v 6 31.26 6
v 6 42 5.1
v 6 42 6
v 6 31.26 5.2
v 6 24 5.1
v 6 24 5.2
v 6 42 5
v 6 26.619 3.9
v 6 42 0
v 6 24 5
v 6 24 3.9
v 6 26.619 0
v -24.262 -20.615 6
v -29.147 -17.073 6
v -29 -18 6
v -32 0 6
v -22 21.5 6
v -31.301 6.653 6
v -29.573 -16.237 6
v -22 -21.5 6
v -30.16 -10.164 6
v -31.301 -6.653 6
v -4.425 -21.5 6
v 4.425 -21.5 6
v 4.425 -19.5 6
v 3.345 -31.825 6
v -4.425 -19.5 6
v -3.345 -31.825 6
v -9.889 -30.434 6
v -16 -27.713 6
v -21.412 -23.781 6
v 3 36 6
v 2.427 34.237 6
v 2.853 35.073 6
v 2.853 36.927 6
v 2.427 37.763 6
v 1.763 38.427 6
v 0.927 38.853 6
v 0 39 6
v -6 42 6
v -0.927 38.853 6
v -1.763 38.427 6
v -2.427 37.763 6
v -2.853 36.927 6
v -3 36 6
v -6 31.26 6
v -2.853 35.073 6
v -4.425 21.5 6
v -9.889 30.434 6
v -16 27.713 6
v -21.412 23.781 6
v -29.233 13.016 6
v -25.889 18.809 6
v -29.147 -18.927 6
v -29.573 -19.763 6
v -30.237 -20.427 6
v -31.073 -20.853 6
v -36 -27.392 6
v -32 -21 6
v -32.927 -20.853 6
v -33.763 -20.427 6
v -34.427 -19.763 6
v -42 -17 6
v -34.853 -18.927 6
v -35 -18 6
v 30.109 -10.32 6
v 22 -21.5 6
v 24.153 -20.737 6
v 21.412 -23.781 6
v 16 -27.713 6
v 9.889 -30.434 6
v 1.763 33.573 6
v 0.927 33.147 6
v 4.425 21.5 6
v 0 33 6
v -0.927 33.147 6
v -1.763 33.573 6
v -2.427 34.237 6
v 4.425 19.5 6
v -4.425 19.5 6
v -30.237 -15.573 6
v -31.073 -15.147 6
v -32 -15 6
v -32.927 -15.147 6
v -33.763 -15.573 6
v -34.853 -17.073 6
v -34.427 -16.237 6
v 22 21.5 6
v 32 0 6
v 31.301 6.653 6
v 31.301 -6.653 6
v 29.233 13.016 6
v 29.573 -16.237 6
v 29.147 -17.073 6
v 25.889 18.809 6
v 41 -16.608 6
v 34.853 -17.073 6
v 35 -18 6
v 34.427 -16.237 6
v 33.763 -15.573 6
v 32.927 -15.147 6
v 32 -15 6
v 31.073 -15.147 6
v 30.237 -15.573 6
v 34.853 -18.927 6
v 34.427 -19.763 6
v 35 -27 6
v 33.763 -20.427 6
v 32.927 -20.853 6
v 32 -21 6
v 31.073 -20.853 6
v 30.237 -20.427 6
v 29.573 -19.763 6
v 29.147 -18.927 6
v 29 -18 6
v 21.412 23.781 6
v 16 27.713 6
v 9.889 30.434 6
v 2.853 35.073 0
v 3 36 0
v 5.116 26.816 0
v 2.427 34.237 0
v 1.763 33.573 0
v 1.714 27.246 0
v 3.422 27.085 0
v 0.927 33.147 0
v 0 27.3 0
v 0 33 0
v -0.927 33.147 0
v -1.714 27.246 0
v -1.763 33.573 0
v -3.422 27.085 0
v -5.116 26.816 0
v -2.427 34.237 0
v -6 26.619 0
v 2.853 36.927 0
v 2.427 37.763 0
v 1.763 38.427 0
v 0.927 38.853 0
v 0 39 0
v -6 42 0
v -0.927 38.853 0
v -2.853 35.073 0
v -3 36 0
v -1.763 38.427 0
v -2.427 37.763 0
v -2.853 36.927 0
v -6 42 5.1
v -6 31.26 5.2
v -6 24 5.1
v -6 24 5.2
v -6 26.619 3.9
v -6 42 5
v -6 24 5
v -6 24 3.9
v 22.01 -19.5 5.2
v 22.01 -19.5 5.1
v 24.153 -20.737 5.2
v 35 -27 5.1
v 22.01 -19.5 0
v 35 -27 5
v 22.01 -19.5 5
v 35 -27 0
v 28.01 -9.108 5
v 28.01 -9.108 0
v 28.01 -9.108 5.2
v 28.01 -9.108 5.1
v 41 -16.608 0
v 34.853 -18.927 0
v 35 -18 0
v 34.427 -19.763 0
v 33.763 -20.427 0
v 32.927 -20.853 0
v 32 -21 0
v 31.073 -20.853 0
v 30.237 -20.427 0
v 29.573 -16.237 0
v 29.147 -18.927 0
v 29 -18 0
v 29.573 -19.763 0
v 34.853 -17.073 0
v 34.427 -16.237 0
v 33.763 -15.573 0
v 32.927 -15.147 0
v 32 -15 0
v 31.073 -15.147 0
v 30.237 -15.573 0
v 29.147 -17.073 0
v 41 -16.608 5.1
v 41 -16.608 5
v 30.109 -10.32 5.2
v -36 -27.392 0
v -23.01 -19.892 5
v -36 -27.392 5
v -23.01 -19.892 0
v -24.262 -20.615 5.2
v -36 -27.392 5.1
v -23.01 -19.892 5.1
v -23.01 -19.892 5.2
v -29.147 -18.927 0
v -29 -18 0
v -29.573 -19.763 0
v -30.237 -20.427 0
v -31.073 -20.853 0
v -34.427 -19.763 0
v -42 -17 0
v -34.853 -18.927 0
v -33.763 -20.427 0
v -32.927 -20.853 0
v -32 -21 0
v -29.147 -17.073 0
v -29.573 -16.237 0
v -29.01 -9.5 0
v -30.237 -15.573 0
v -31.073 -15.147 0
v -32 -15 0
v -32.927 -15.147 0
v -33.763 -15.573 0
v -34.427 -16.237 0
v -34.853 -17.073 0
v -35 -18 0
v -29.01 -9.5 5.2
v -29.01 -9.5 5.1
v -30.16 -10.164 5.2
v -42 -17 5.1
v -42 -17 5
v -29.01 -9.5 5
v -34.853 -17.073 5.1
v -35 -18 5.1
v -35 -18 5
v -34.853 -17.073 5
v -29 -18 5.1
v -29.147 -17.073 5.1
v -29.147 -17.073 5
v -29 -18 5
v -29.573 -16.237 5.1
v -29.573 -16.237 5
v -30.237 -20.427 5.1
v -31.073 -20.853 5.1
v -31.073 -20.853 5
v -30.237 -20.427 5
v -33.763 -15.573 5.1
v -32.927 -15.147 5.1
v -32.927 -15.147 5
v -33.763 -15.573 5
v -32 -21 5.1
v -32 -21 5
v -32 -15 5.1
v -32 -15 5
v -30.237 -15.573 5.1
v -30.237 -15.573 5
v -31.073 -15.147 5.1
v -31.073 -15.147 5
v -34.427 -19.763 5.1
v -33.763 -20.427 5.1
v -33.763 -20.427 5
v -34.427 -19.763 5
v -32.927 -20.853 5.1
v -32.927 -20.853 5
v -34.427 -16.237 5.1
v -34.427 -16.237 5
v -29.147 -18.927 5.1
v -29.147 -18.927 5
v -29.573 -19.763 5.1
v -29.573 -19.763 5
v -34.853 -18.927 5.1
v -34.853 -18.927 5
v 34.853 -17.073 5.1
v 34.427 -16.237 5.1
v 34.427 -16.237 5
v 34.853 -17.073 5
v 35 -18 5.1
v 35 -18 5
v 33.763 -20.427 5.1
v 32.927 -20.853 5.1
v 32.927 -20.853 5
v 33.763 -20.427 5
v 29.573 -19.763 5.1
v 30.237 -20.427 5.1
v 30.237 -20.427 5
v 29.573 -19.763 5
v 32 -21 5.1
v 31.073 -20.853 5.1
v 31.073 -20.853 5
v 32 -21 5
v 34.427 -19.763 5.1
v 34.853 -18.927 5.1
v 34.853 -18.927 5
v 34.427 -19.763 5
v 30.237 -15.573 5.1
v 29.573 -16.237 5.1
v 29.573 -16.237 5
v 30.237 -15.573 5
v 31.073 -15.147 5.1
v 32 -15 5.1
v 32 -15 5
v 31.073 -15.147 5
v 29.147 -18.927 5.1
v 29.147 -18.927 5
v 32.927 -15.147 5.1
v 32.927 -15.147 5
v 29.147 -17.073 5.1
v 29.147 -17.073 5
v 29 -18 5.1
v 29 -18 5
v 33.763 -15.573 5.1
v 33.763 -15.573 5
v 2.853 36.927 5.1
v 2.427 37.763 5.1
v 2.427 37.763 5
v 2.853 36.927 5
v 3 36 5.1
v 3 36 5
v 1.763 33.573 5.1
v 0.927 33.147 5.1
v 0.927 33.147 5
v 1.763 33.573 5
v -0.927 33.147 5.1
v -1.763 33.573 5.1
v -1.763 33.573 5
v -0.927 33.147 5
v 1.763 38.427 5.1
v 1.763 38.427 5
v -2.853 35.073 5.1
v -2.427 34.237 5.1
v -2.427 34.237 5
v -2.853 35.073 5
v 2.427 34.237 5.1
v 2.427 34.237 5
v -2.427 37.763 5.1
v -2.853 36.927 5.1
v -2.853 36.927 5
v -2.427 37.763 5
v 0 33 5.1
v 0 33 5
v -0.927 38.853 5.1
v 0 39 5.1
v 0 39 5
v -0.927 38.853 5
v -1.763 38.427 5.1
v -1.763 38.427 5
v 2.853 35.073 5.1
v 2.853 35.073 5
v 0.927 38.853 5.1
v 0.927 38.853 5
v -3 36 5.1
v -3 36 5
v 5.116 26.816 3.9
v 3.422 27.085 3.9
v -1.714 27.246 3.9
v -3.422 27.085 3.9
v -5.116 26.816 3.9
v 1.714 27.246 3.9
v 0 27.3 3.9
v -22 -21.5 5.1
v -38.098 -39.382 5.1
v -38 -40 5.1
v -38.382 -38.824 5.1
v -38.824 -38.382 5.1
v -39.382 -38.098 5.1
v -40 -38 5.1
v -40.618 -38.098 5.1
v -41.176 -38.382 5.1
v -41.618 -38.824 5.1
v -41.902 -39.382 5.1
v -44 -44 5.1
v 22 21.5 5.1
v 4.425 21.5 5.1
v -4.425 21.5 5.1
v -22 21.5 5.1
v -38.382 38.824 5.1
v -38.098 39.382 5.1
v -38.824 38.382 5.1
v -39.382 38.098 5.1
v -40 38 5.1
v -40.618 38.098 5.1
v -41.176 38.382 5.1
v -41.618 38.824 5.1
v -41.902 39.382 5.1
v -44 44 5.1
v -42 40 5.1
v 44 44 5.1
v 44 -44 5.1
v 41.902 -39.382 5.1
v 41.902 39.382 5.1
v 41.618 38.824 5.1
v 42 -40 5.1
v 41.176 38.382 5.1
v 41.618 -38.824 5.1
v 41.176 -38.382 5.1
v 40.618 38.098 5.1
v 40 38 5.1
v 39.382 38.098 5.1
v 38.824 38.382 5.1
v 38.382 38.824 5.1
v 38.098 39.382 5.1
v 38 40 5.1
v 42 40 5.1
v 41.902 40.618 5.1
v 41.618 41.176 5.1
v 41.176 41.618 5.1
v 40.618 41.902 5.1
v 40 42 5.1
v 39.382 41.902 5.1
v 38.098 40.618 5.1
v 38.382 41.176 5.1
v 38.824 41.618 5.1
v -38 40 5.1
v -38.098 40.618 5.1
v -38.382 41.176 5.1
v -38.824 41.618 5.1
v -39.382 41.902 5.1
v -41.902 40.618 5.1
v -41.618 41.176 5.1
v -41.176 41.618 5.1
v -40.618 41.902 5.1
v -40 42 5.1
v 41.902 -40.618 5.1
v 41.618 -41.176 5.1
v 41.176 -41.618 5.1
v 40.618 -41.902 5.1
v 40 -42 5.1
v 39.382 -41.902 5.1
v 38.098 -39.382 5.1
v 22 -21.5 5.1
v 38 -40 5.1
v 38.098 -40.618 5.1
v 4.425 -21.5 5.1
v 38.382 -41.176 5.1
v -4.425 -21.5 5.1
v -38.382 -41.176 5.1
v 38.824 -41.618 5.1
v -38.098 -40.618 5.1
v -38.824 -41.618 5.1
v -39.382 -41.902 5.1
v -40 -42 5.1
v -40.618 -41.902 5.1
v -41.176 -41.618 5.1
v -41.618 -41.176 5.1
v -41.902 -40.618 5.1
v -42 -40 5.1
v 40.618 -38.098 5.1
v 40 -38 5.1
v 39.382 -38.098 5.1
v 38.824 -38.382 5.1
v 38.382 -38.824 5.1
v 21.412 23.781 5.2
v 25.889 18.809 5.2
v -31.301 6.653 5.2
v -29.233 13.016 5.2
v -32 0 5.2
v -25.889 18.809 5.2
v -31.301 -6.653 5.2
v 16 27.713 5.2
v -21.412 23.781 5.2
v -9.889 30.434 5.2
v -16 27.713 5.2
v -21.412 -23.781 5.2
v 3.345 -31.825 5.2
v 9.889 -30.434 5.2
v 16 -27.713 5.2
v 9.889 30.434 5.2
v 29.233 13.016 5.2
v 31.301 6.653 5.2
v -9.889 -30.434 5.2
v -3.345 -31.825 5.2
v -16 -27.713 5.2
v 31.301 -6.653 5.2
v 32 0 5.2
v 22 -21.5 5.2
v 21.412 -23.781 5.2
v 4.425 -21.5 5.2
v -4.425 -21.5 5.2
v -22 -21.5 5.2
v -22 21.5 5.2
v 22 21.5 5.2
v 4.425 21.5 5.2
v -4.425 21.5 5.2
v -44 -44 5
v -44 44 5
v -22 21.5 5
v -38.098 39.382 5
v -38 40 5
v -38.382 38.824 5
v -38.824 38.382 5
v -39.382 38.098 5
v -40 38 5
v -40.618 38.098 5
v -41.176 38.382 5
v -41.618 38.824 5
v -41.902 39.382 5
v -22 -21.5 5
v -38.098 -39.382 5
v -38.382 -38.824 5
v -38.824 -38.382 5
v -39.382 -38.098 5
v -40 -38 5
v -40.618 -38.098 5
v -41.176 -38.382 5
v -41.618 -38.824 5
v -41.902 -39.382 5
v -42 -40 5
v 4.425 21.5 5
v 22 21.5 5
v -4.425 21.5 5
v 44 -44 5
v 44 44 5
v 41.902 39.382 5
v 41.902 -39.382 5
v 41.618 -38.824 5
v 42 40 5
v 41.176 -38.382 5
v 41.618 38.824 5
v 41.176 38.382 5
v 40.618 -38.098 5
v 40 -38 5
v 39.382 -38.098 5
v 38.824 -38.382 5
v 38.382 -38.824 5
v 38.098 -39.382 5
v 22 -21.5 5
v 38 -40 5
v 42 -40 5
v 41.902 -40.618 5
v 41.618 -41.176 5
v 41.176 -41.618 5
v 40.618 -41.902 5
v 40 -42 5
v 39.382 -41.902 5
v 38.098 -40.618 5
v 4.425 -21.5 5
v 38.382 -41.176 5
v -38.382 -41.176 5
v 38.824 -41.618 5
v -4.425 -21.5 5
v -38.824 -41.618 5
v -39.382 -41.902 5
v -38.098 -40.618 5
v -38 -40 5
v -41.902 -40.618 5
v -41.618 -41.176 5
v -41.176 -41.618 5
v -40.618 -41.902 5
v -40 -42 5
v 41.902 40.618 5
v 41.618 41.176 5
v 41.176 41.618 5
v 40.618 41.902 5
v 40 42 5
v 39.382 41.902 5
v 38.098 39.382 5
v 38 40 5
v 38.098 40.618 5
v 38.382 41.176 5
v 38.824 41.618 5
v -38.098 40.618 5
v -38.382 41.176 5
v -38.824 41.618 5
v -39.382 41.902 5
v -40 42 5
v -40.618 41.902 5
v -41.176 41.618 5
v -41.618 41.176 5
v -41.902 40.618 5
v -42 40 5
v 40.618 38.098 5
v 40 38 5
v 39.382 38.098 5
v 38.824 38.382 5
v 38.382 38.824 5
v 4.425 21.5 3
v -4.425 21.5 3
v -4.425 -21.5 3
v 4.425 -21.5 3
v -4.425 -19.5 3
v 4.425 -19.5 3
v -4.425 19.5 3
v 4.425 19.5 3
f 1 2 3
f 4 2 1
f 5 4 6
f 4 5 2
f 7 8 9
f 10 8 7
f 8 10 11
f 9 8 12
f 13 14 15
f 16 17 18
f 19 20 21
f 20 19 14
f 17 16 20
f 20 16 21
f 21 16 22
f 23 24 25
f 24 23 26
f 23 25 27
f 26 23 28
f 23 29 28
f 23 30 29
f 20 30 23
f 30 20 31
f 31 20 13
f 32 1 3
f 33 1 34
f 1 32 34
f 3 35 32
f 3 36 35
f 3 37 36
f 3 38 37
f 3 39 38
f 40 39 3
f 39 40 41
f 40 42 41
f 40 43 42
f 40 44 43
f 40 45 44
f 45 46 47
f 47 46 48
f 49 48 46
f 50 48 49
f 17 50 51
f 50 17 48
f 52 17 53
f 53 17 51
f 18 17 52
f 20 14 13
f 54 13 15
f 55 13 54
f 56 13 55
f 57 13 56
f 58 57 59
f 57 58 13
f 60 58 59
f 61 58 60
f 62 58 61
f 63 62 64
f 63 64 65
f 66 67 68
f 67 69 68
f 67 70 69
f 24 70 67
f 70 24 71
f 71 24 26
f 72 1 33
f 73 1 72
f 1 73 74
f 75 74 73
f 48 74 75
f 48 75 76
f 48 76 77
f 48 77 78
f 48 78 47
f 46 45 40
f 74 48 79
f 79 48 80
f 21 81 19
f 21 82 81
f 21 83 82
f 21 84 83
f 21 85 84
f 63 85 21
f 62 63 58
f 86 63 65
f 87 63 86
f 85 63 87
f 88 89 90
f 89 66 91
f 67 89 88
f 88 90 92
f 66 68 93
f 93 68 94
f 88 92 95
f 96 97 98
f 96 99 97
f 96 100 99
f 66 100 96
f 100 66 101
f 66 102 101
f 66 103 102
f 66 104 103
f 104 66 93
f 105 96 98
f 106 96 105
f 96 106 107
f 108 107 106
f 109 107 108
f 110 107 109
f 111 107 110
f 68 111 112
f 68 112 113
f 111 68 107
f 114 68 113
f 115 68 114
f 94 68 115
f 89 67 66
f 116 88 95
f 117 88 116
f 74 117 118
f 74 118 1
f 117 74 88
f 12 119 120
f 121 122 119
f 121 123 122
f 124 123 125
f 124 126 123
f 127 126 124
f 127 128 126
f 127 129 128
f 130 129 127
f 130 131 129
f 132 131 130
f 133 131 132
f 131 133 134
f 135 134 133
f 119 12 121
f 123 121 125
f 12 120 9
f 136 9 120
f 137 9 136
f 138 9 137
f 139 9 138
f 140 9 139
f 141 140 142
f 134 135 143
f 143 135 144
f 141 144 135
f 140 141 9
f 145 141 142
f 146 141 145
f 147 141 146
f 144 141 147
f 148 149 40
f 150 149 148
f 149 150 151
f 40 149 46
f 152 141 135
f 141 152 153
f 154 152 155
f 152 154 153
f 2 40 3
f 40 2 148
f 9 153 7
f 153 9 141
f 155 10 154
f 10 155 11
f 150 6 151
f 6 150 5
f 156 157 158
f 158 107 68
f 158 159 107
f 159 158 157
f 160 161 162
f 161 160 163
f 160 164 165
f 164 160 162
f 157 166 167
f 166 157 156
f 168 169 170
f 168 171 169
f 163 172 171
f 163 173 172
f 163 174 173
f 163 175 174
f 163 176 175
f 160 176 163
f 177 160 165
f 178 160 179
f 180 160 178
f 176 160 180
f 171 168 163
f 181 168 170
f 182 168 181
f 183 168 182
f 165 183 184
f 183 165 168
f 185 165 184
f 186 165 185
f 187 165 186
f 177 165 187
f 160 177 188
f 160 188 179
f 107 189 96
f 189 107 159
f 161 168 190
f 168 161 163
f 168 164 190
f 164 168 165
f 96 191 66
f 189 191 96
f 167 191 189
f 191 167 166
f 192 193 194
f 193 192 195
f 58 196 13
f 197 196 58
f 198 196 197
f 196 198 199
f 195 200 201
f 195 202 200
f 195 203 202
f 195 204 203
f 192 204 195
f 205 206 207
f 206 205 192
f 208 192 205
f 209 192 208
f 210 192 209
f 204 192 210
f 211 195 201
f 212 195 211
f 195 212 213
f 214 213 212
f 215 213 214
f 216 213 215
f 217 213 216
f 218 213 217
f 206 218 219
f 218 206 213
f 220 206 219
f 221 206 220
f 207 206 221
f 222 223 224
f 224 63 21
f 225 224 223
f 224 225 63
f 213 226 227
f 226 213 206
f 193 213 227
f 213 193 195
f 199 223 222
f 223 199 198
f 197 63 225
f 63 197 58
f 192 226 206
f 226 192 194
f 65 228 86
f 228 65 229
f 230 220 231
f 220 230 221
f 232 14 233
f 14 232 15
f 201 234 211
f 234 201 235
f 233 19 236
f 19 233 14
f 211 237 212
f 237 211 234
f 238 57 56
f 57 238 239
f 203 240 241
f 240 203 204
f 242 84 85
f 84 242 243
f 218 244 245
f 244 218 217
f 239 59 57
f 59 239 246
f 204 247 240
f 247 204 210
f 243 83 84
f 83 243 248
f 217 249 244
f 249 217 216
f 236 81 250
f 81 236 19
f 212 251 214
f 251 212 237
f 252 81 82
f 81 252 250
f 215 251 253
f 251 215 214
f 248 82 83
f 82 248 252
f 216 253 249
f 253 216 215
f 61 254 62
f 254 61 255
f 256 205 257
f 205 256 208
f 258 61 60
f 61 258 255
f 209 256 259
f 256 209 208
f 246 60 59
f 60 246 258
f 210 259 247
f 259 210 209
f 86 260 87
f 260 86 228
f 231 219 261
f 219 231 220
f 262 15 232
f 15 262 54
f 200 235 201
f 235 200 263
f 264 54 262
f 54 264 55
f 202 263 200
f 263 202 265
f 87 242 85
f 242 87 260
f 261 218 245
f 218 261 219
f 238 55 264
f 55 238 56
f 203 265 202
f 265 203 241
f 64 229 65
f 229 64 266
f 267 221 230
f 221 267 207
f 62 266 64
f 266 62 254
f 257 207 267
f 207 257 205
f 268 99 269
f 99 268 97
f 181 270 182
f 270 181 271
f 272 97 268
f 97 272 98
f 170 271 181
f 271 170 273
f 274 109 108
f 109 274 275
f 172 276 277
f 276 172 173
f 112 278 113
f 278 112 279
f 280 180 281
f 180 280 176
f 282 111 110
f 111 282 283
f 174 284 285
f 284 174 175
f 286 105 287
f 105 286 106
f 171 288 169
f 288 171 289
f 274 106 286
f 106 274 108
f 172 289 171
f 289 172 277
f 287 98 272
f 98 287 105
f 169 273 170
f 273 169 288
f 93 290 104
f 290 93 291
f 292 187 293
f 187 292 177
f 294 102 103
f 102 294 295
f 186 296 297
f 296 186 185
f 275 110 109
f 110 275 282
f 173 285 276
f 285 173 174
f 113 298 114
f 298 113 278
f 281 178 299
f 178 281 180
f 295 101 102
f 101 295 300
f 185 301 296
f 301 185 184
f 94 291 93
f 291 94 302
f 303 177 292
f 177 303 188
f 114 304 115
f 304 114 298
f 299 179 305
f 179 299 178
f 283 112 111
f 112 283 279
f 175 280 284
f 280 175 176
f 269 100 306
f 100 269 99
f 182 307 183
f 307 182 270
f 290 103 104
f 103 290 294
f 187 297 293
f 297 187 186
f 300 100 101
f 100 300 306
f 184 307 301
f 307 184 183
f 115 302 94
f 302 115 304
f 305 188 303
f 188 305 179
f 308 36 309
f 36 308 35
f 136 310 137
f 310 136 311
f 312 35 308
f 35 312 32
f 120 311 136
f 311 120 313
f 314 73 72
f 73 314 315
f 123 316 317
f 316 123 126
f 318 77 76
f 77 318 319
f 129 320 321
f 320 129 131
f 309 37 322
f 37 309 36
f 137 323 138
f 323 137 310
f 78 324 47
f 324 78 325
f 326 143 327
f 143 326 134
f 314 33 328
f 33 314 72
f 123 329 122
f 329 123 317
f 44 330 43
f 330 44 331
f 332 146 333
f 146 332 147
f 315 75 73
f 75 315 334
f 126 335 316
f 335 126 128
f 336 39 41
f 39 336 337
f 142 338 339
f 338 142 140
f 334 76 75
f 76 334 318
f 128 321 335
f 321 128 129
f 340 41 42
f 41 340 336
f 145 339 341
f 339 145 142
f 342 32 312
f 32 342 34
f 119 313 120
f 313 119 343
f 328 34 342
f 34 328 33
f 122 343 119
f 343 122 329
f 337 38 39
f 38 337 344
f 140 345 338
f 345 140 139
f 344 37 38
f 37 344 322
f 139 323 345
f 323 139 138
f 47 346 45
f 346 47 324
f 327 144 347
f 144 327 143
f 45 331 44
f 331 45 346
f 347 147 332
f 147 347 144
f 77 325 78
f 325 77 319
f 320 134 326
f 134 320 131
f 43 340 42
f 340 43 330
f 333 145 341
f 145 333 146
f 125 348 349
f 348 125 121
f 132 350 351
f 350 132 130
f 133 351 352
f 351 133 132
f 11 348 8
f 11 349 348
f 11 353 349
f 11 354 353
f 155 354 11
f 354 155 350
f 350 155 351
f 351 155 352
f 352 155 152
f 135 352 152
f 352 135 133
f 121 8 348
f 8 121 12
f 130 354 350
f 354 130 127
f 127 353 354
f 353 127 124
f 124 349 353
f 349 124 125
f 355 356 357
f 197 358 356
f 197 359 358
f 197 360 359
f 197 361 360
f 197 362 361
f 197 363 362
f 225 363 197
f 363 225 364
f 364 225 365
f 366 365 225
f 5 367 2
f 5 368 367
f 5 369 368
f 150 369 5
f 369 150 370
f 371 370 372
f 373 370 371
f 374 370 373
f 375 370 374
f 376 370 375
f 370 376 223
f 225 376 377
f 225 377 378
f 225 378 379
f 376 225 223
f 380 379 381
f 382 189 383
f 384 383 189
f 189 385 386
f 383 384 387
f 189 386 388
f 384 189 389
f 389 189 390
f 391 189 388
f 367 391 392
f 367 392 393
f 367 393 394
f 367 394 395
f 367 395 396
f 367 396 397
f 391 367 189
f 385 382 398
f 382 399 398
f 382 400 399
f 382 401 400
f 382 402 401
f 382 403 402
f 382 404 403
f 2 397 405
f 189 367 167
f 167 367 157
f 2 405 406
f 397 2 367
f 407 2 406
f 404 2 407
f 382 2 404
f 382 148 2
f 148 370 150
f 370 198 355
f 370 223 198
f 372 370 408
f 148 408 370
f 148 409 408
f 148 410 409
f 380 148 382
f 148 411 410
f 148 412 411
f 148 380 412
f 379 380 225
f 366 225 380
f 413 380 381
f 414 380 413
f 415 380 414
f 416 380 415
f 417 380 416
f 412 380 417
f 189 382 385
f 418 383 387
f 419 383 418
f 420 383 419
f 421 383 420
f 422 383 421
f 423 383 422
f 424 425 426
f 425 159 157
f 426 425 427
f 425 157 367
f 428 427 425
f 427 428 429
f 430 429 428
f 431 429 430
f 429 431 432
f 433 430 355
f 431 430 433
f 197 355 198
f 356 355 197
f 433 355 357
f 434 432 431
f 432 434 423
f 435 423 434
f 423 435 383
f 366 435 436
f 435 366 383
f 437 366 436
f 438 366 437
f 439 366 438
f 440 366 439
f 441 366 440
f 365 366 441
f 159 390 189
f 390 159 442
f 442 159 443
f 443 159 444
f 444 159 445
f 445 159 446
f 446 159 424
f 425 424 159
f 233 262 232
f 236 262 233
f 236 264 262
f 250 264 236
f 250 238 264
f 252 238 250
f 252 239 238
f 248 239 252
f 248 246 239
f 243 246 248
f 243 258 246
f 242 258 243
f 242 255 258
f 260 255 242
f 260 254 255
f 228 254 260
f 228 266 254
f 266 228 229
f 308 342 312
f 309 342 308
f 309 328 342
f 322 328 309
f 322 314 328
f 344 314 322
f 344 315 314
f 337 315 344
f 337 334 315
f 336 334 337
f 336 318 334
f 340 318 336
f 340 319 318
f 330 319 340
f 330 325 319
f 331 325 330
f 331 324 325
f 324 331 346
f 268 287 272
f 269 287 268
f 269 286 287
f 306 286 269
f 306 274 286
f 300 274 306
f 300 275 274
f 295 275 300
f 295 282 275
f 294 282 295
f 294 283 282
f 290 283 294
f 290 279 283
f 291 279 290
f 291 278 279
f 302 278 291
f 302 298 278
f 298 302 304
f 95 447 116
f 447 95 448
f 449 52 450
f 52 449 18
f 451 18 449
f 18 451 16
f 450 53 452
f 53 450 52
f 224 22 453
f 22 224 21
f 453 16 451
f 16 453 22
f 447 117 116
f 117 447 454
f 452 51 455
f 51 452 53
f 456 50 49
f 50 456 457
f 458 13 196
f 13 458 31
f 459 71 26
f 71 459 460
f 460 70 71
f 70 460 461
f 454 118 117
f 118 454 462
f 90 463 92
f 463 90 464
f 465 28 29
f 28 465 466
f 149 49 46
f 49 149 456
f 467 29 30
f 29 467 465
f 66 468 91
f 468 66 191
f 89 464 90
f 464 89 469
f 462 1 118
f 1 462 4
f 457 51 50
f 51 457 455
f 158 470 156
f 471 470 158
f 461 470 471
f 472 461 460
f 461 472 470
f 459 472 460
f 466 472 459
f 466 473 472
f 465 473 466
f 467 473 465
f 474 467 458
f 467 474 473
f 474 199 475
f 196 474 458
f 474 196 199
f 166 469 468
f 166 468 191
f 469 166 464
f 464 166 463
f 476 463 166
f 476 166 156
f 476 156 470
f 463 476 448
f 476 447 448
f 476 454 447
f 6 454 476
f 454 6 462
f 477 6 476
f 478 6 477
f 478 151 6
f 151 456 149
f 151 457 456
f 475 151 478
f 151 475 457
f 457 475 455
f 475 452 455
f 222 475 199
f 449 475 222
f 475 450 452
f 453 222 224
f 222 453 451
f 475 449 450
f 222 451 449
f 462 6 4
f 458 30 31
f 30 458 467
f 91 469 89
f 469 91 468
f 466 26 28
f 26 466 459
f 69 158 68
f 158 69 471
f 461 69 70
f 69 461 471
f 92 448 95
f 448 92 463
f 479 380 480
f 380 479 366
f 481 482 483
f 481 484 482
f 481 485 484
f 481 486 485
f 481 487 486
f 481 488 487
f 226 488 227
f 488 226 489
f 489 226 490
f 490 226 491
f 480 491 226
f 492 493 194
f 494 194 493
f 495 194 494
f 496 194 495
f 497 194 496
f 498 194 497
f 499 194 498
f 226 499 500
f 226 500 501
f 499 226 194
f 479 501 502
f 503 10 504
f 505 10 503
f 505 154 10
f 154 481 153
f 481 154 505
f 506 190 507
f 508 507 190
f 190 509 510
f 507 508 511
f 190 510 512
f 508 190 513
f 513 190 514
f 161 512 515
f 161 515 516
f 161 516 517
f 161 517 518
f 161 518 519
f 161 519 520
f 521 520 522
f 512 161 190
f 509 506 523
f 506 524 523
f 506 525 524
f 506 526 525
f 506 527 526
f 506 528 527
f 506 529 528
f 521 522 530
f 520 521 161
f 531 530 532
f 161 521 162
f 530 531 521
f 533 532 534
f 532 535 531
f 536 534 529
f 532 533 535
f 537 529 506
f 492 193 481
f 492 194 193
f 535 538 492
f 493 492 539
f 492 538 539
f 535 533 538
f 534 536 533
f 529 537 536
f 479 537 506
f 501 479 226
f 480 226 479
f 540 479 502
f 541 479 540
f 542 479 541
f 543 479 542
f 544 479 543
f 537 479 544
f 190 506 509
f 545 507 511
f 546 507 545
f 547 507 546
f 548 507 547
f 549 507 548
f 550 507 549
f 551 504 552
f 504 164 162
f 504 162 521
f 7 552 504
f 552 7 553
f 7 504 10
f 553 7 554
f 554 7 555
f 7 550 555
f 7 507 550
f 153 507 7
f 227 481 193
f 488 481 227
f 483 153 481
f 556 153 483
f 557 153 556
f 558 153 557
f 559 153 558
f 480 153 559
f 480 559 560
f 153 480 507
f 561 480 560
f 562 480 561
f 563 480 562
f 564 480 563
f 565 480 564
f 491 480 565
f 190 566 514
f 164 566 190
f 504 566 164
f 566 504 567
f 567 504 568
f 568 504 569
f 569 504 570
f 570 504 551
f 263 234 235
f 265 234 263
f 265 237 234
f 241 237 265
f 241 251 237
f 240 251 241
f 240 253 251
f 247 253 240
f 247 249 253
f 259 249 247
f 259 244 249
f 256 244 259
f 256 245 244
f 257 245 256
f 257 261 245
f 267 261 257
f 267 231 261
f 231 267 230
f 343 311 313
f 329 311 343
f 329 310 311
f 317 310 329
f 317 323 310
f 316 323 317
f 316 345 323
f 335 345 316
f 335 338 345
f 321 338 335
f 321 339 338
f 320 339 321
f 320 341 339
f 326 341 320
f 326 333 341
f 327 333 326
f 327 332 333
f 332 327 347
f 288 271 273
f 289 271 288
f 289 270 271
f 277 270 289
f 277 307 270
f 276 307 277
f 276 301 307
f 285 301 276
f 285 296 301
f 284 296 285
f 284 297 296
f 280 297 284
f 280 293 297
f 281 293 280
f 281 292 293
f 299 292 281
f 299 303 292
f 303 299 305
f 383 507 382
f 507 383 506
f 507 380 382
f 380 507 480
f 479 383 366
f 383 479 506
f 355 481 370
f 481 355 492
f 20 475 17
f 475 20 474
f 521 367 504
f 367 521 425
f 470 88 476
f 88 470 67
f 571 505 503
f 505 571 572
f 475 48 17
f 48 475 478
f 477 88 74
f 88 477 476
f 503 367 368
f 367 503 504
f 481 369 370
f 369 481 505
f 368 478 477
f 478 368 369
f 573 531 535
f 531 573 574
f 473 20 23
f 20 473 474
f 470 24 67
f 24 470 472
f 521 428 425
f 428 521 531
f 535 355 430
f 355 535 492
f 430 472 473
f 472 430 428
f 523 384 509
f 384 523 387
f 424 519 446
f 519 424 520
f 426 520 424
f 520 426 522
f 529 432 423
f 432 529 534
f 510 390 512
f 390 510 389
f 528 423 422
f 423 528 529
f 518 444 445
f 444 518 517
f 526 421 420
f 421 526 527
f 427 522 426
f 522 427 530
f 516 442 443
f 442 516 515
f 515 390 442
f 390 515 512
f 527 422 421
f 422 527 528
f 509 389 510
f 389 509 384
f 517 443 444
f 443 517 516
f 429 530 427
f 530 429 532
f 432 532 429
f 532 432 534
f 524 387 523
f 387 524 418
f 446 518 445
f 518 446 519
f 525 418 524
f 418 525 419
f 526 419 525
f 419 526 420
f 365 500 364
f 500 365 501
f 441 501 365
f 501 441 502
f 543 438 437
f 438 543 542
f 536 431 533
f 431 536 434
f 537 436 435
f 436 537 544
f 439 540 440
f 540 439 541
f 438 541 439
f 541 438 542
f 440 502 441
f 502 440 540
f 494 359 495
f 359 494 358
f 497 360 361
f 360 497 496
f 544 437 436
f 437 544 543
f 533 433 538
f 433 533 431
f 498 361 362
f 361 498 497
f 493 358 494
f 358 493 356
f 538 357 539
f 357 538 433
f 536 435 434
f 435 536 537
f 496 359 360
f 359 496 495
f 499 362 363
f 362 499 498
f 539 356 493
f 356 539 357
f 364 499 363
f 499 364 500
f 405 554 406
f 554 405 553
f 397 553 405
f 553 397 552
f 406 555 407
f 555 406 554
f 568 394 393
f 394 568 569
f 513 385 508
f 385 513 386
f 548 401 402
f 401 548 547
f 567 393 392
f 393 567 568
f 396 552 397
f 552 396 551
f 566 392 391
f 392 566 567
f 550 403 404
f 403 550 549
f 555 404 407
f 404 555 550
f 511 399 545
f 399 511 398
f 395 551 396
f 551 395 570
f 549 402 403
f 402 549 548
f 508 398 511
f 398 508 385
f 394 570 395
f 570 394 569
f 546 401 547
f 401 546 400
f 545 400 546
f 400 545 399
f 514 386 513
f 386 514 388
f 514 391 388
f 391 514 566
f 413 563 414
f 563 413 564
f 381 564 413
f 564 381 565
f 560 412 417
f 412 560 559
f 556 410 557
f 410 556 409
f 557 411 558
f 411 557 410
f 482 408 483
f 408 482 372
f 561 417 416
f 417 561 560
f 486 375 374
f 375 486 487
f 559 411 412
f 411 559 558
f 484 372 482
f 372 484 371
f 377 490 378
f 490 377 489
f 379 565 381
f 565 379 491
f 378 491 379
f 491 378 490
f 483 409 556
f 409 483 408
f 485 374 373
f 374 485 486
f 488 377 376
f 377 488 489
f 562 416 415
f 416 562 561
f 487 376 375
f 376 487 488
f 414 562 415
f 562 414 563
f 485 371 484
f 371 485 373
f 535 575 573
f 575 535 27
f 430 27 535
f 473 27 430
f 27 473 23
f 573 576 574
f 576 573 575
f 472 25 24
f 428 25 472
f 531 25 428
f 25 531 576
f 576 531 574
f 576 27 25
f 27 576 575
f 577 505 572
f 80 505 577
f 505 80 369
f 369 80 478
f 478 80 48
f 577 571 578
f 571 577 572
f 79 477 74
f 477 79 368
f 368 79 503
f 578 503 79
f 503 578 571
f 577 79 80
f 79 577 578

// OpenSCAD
// file: ../../library.scad
module tubo(
	h/*Altura*/,
	w/*Pared*/,
	d/*Diametro*/
){
  difference()
  {
    cylinder(r=(d/2), h);
    translate([0,0,-0.1])
    cylinder(r=(d/2)-(2*w), h+0.2);
  }
}

module huyoMasPared(
	d/*Diametro del hoyo*/,
	w/*Pared*/,
	h/*Altura*/,
){
  difference()
  {
    cylinder(r=((d+(2*w))/2), h);
    translate([0,0,-0.1])
    cylinder(r=(d/2), h+0.2);
  }
}

module cuboMasPared(
    w1, //Largo
    w2, //Ancho
    p1, //Pared
    p2, //Pared
    h   //Alto
)
{    
    difference()
    {
        translate([-(w1+(p1*2))/2,-(w2+(p2*2))/2,0])
        cube([(w1+(p1*2)),(w2+(p2*2)),h]);
        
        translate([-w1/2,-w2/2,-0.2])
        cube([w1,w2,h*2]);
        
    }
    
    
}

soporteW = 0.7;

module soporteCylinder()
{
  difference()
  {
	cylinder(r=radio,altura);

	translate([0,0,-0.1])
	cylinder(r=radio-soporteW,altura+0.2);
  }

  if(true){
  difference()
  {
	cylinder(r=radio+0.75,1);

	translate([0,0,-0.1])
	cylinder(r=radio-0.75,1.25);
  }}

}

module soporteOval()
{
  difference()
  {
	oval(w=ancho, h=largo, height=alto, center = false);

	translate([0,0,-0.1])
	oval(ancho-soporteW, largo, alto+0.2);
  }

  difference()
  {
	oval(w=ancho+1, h=largo+1, height=1, center = false);

	translate([0,0,-0.1])
	oval(w=ancho-1, h=largo-1, height=1.25, center = false);
  }

}


module oval(w,h, height, center = false)
{
  scale([1, h/w, 1]) cylinder(h=height, r=w, center=center);
}
// file: navaja.scad
include <../../library.scad>
include <Diffracter.scad>
//include <lente.scad>

pared = 3;


//lenRIntNavajas = 19/2;
lenIntHNavajas = 4;//3.6

offsetRanura = -0.35;//-.
offsetNavaja = 0.5;//0
offsetPosDer = 0.0;

navW = 21.5+offsetNavaja;
navH = 43;
navP = 3;//3
navTorR = 1.35;//1.2
navSepW = 9.2+offsetRanura;
navSepH = 2;


navBigW = (navW*2) + (pared*2);
navBigH = navH + pared;

navajasH = navP+lenIntHNavajas;

navajasH = 6;//8 //Quitar para altura real

soloProbar = 0;

navHoleRad = 14;

if( 0 )
{
    if( soloProbar )
    {
        difference()
        {
            translate([0,0,navajasH])
            rotate([0,180,0])
            creaNavajas( navajasH );
            
            translate([0,0,-0.2])
            cuboMasPared(49,49,30,30,15);
            
        }
    }
    else
    {
        translate([0,0,navajasH])
        rotate([0,180,0])
        creaNavajas( navajasH );
    }
}




module creaNavajas( intH )
{


//%cylinder(r=34,15);
difference()
{
    //Área navajas-lente
    translate([-bigW/2,-bigW/2,0])
    cube([bigW,bigW,intH]);
    
    //Recorte área navaja
    translate([-navW-offsetPosDer,-navH/2,-0.1])
    cube([(navW*2),navH,navP]);
    
    //Área tapón
    //translate([0,0,navP-0.4])
    cylinder(r=navHoleRad,intH+0.1);
    
    //Tornillitos
    translate([-navW/2,13,0])
    cylinder(r=navTorR,navP+lenIntHNavajas-0.1,$fn=20);
    translate([navW/2,13,0])
    cylinder(r=navTorR,navP+lenIntHNavajas-0.1,$fn=20);
    translate([-navW/2,-13,0])
    cylinder(r=navTorR,navP+lenIntHNavajas-0.1,$fn=20);
    translate([navW/2,-13,0])
    cylinder(r=navTorR,navP+lenIntHNavajas-0.1,$fn=20);
    
    //Tornillos abajo
    translate([-ori+4,-ori+4,-0.1])
    cylinder(r=tornR,20,$fn=20);
    translate([ori-4,-ori+4,-0.1])
    cylinder(r=tornR,20,$fn=20);
    translate([-ori+4,ori-4,-0.1])
    cylinder(r=tornR,20,$fn=20);
    translate([ori-4,ori-4,-0.1])
    cylinder(r=tornR,20,$fn=20);
    
    //Sello
    translate([0,0,-0.1])
    huyoMasPared(
                   64,//73
                   35,//30
                   intH+1
                  );
    //translate([0,0,-0.1])
    //cylinder(r=selloHembraRadio,4);
    
}

//translate([0,0,pared-lenP+0.2])
//translate([0,0,navajasH-lenP+0.4])
//thread_in_pitch(lenDiam,lenP,1.7);

translate([-navSepW/2,-navH/2,0])
cube([navSepW,navSepH,navP]);

translate([-(navSepW/2),(navH/2)-navSepH,0])
cube([navSepW,navSepH,navP]);



}
// file: Diffracter.scad
//include <Tapa.scad>
include <../../library.scad>


bigW = 88;
ori = bigW/2;
raspSellR = 59;
tuboH = 140;
H = 18.5 + 9;
selloH = 7;
tornR = 2;

huecoPared = 12;
huecoH = 22;
selloHembraRadio=40;

//Activate this to display
if(0)
{
//translate([0,0,bigW/2])
//rotate([0,90,0])
diffracter();


//soporteCylinder(radio=25.2,altura=3.8);

}


module diffracter(){	

difference(){

//Bloque
translate([-bigW/2,-bigW/2,0])
cube([bigW,bigW,H]);

/*
translate([
						-(bigW-huecoPared)/2,
						-(bigW-huecoPared)/2,
						(huecoH/2)
					])
		cube([
					bigW-huecoPared,
					bigW-huecoPared,
					H-huecoH]
				);*/


//Diffractador
translate([-37.25,-40,-0.1])
cube([74.5,80,5.6]);

//Macro
translate([0,0,5.4])
cylinder(r=(74.5/2),8.2,$fn=100);

//Sello de raspberry
//translate([0,0,-0.1])
//cylinder(r=(raspSellR/2)+1,2);

//Tubo
//translate([0,0,-0.1])
//cylinder(r=(52/2),200);

//Tornillos abajo
translate([-ori+4,-ori+4,-0.1])
cylinder(r=tornR,20);
translate([ori-4,-ori+4,-0.1])
cylinder(r=tornR,20);
translate([-ori+4,ori-4,-0.1])
cylinder(r=tornR,20);
translate([ori-4,ori-4,-0.1])
cylinder(r=tornR,20);

//Hueco
cylinder(r=36,H+1);

//Tornillos caja
translate([0,0,(tuboH/2)-7])
rotate([0,90,0])
tornillosArriba();

//Tornillo tripie
translate([-ori-0.1,0,(tuboH/2)+7])
rotate([0,90,0])
cylinder(r=5/2,5.31);

//Sello hembra
//translate([0,0,H-3])
//cylinder(r=selloHembraRadio,4);

}

//Sello cobertura
//translate([0,0,H-1])
//huyoMasPared(58,3,3);


}
// main file
include <Diffracter.scad>
include <navaja.scad>

cannonDiam1 = 52.6;
cannonDiam2 = 54.6;
cannonPared = 3;
cannonNavBase = 3;
cannonH = 14+cannonNavBase;




difference()
{
   baseTornillos(); //cylinder(r=bigW/2,cannonNavBase,$fn=100);
    
    translate([0,0,-0.1])
    cylinder(r=(cannonDiam1+2)/2,cannonNavBase+1,$fn=100);
    
    tornTriang();
}


module baseTornillos()
{
    translate([-6,24,0])
    cube([12,18,6]);
        
    translate([35,-27,0])
    rotate([0,0,60])
    cube([12,15,6]);
    
    translate([-42,-17,0])
    rotate([0,0,-60])
    cube([12,15,6]);
    
}

translate([0,0,6])
rotate([0,180,0])
creaNavajas();

module tornTriang()
{
    translate([-32,-18,-0.1])
    cylinder(r=3,cannonPared*4,$fn=20);
    
    translate([32,-18,-0.1])
    cylinder(r=3,cannonPared*4,$fn=20);
    
    translate([0,36,-0.1])
    cylinder(r=3,cannonPared*4,$fn=20);
    
}
